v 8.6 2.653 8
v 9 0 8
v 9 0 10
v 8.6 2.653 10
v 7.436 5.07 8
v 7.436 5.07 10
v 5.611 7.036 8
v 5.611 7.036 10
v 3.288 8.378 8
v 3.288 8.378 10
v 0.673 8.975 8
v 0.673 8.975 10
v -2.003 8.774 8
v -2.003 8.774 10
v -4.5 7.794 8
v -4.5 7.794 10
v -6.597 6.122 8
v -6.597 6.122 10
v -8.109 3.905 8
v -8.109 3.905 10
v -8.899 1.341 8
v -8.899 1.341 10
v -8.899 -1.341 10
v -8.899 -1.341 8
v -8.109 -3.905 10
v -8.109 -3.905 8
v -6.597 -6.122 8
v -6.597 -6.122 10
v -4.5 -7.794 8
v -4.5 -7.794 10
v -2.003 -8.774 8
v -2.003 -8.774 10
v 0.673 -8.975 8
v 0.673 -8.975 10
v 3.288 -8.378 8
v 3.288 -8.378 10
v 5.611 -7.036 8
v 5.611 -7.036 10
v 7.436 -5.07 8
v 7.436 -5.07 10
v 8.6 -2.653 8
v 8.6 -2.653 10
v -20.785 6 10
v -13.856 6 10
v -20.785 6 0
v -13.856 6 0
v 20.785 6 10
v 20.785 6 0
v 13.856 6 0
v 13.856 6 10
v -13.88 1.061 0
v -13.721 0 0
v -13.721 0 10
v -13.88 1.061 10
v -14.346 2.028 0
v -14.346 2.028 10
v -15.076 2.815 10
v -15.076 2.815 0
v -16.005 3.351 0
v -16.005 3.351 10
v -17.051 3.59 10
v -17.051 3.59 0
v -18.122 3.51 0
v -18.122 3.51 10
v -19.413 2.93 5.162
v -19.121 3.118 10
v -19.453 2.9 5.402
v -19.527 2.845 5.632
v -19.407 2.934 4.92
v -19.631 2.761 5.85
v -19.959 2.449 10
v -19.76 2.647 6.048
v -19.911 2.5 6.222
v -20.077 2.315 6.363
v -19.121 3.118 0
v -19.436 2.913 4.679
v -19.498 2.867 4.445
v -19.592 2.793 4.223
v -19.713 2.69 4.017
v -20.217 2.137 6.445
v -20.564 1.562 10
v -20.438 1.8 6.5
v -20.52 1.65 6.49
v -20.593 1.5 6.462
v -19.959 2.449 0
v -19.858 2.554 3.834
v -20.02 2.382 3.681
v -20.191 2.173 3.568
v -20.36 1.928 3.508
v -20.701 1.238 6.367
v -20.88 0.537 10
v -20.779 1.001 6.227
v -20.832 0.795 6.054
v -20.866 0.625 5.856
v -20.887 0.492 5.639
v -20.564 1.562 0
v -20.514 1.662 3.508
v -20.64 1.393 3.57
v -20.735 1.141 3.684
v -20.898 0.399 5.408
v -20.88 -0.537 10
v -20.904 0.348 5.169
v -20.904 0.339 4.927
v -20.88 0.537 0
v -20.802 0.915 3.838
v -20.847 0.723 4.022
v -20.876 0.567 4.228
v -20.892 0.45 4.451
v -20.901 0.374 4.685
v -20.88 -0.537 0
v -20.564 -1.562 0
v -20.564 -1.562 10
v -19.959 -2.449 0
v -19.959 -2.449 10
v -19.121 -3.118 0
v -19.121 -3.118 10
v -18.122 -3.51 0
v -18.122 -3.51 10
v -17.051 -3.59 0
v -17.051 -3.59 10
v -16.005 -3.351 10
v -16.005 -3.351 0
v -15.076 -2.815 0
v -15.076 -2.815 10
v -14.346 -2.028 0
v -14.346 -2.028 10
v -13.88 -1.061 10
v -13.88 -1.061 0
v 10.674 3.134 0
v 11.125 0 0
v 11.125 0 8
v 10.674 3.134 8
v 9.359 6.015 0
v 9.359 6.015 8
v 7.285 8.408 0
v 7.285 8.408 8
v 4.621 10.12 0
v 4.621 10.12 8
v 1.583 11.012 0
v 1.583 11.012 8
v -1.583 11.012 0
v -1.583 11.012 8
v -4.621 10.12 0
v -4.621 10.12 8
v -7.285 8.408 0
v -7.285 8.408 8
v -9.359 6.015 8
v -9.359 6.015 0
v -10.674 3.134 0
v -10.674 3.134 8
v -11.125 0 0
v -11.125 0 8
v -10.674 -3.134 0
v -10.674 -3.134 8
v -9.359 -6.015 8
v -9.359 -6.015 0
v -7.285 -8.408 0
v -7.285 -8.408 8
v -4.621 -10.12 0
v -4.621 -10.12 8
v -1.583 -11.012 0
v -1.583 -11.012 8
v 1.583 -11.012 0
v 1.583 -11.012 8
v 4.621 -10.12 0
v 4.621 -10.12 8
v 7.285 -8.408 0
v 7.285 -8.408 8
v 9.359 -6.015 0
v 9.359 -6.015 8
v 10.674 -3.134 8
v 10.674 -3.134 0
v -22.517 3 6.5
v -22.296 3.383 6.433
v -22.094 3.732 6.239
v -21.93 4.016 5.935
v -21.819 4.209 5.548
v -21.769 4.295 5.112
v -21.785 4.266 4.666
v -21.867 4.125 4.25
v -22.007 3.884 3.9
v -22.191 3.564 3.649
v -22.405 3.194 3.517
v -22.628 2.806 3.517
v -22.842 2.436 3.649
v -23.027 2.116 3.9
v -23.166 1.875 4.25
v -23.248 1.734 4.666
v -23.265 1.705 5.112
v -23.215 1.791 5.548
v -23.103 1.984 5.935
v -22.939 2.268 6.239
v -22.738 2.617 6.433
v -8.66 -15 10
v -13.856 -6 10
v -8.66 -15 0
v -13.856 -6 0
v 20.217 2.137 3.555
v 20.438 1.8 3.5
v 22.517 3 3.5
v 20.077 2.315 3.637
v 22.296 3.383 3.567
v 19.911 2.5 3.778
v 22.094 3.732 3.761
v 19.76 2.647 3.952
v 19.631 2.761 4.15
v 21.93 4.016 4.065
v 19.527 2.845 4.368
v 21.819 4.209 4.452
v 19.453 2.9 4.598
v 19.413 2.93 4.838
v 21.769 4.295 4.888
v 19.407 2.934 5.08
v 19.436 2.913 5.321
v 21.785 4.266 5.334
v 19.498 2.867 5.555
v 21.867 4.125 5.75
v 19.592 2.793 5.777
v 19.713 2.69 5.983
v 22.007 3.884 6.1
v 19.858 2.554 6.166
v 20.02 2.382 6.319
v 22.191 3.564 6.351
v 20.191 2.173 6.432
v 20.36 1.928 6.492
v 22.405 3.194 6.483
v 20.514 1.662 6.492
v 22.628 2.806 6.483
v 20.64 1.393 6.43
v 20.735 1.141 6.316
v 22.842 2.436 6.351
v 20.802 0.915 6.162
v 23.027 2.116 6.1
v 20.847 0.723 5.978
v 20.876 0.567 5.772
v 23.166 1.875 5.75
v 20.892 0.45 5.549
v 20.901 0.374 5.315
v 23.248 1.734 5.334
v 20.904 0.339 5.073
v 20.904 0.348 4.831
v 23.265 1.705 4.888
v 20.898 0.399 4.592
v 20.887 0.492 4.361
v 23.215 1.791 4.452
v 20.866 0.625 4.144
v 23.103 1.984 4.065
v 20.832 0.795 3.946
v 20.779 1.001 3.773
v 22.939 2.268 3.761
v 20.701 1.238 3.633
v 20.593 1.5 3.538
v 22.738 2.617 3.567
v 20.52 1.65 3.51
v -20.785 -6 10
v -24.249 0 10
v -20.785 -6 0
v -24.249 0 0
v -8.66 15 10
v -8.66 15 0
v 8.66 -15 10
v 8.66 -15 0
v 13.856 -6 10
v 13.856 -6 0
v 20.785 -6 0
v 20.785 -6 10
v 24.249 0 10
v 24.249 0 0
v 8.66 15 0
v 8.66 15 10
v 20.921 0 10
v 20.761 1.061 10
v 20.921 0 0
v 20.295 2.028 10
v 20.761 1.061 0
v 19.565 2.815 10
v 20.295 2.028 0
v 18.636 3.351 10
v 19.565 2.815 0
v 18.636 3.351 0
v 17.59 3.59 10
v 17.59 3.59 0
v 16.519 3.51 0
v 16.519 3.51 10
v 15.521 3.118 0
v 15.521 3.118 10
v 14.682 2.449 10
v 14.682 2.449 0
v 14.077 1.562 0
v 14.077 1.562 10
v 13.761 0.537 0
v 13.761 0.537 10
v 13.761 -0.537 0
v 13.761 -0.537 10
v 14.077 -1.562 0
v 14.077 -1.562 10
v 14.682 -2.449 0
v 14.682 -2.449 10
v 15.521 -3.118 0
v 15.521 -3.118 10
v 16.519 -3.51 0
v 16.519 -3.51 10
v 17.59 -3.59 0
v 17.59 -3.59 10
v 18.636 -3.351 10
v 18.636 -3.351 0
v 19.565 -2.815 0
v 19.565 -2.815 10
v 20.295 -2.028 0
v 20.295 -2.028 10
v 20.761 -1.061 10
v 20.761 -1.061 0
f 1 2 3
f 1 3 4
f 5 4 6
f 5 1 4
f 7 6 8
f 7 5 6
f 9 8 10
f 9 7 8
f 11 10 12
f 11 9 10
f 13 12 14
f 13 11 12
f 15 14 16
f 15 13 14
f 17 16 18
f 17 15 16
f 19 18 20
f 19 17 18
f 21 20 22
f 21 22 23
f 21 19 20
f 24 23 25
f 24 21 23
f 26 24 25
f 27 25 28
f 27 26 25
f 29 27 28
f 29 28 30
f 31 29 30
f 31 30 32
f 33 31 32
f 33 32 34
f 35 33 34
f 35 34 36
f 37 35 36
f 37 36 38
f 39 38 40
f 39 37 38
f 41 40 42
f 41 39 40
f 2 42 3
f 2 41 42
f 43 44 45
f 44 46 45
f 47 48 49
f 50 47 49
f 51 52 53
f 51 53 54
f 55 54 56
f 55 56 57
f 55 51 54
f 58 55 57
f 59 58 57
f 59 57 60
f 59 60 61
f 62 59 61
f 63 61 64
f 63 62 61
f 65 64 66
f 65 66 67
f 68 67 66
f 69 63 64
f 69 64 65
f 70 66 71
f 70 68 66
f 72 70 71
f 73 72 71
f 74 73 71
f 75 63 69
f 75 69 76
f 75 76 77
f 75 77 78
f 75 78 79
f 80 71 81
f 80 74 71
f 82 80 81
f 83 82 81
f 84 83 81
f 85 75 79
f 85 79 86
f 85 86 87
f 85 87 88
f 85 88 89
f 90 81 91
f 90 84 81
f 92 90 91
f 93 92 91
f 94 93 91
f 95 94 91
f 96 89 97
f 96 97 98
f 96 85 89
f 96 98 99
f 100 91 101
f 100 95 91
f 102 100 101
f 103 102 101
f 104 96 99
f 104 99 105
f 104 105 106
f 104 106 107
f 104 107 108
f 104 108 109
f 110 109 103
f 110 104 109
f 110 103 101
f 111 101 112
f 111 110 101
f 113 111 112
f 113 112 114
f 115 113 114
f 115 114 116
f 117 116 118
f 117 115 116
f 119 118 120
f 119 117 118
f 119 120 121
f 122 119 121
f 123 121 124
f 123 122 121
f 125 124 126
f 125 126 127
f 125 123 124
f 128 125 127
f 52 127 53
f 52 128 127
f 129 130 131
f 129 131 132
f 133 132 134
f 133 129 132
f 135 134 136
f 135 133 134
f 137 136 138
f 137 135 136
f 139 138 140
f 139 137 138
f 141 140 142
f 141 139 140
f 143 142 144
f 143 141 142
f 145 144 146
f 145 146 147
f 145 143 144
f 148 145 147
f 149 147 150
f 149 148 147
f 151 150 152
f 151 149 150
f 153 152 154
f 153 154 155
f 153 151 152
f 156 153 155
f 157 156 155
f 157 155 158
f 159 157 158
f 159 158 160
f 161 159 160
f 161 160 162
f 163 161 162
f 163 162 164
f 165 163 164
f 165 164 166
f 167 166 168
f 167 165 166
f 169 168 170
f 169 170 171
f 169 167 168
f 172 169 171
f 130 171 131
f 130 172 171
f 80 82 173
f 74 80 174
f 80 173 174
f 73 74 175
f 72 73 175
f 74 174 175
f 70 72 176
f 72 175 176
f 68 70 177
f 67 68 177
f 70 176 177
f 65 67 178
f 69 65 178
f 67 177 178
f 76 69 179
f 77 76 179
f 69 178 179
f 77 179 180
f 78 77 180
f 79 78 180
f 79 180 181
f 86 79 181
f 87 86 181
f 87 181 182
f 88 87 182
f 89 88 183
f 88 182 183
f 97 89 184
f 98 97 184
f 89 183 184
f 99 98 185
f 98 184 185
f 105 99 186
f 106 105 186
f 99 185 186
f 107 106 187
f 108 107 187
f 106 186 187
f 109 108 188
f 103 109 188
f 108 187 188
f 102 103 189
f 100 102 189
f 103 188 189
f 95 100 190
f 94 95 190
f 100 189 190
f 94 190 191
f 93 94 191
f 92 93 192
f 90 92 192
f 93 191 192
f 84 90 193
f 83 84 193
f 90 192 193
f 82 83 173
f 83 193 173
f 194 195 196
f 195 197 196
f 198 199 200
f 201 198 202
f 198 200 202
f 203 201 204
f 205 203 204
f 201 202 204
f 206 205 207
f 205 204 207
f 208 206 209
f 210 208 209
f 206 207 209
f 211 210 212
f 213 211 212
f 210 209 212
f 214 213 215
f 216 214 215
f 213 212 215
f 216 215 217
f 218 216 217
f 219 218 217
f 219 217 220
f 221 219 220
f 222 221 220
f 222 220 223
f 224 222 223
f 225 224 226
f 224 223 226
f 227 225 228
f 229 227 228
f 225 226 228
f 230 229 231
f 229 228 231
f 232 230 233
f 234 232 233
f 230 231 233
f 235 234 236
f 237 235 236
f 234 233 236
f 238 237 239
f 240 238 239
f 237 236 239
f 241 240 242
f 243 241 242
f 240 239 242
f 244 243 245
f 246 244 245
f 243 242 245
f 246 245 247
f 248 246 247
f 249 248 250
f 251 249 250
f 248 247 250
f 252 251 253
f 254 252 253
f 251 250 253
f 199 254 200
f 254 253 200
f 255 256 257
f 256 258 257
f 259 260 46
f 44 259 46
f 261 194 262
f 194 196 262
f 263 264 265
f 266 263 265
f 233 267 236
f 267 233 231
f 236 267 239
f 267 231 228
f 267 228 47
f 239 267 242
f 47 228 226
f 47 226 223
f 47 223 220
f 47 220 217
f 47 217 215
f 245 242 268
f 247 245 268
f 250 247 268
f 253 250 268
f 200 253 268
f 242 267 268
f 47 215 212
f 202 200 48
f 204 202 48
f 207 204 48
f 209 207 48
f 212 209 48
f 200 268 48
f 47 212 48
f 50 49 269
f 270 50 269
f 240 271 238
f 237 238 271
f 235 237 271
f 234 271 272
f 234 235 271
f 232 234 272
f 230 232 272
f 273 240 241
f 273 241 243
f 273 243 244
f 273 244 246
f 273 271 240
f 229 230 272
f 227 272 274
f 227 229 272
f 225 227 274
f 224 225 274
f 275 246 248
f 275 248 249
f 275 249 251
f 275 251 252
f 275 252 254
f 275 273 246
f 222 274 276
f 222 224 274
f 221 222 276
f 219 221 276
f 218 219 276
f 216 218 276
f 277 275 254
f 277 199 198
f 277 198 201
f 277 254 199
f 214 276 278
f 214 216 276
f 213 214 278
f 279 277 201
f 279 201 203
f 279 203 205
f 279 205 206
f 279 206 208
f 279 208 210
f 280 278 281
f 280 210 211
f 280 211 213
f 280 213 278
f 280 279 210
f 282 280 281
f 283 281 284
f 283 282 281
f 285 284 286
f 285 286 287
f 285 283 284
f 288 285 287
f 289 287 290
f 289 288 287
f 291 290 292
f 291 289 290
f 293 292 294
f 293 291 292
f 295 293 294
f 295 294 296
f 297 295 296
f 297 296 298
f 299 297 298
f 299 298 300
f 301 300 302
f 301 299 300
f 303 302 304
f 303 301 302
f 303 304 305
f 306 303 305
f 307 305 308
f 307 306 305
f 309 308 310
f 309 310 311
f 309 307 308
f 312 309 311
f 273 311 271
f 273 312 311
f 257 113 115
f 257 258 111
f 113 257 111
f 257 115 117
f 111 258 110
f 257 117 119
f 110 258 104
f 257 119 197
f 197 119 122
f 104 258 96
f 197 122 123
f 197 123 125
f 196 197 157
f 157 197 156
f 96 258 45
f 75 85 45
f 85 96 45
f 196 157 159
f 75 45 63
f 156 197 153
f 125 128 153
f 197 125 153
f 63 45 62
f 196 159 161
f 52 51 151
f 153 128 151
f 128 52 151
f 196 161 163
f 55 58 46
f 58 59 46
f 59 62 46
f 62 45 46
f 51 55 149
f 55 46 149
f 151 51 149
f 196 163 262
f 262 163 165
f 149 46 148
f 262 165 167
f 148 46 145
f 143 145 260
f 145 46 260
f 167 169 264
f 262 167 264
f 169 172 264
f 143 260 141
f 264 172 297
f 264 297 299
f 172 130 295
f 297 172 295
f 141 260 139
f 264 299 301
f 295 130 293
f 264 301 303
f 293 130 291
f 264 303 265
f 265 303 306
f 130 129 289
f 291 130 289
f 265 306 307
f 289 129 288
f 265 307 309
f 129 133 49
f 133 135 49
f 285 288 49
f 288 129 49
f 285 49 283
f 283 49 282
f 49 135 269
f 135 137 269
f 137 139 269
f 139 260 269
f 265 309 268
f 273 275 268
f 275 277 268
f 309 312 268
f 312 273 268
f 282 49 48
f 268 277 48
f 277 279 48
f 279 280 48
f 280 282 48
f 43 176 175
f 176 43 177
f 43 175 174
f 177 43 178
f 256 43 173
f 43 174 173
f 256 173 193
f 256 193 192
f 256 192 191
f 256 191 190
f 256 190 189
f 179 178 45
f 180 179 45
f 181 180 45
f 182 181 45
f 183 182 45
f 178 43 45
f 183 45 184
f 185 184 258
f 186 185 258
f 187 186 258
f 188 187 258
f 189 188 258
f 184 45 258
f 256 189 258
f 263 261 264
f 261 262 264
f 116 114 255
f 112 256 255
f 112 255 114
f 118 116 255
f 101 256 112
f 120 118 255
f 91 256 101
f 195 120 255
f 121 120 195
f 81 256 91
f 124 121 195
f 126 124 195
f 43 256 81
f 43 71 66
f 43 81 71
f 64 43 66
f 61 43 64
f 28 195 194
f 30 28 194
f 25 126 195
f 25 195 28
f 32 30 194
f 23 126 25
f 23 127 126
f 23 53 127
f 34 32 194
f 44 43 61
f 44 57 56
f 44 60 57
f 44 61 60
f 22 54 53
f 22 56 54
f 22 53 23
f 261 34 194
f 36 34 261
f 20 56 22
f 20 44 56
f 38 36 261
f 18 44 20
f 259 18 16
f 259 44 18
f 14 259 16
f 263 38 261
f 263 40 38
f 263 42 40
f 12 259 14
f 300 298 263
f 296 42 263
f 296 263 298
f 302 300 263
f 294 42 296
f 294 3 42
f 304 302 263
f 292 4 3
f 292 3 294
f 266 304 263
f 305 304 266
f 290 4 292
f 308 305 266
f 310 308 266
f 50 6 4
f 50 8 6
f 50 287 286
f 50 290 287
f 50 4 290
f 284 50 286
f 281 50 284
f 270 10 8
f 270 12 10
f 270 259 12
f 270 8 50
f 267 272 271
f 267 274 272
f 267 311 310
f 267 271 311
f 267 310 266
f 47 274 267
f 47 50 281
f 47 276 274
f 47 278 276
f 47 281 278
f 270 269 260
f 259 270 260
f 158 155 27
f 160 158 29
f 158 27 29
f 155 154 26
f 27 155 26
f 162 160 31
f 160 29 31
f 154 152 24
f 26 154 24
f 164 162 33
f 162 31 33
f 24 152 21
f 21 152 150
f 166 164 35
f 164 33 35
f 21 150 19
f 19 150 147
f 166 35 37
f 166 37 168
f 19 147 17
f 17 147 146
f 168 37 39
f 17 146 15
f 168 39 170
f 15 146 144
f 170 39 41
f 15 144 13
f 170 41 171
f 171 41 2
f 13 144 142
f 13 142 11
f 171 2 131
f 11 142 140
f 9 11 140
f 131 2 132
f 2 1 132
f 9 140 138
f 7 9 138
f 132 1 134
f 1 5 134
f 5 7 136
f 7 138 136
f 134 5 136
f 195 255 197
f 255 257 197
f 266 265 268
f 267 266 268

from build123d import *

# Parameters (mm, degrees)
SKETCH3_R           = 11.125
SKETCH3_R_2         = 3.6
BOSS_EXTRUDE1_DEPTH = 8
SKETCH4_R           = 9
SKETCH4_R_2         = 3.6
BOSS_EXTRUDE3_DEPTH = 2
CUT_EXTRUDE1_REACH  = 51.5
SKETCH5_R           = 1.5
CUT_EXTRUDE2_REACH  = 51.5
SKETCH6_R           = 1.5


with BuildPart() as part:
    # Sketch3 → Boss-Extrude1 (new body)
    with BuildSketch(Plane.XY):
        Polygon((8.660254038, 15), (-8.660254038, 15), (-13.856406461, 6), (-20.784609691, 6), (-24.248711306, 0), (-20.784609691, -6), (-13.856406461, -6), (-8.660254038, -15), (8.660254038, -15), (13.856406461, -6), (20.784609691, -6), (24.248711306, 0), (20.784609691, 6), (13.856406461, 6), align=None)
        Circle(SKETCH3_R, mode=Mode.SUBTRACT)
        with Locations((17.320508076, 0)):
            Circle(SKETCH3_R_2, mode=Mode.SUBTRACT)
        with Locations((-17.320508076, 0)):
            Circle(SKETCH3_R_2, mode=Mode.SUBTRACT)
    extrude(amount=BOSS_EXTRUDE1_DEPTH)

    # Sketch4 → Boss-Extrude3 (add)
    with BuildSketch(Plane.XY.offset(8)):
        Polygon((-8.660254038, 15), (-13.856406461, 6), (-20.784609691, 6), (-24.248711306, 0), (-20.784609691, -6), (-13.856406461, -6), (-8.660254038, -15), (8.660254038, -15), (13.856406461, -6), (20.784609691, -6), (24.248711306, 0), (20.784609691, 6), (13.856406461, 6), (8.660254038, 15), align=None)
        Circle(SKETCH4_R, mode=Mode.SUBTRACT)
        with Locations((-17.320508076, 0)):
            Circle(SKETCH4_R_2, mode=Mode.SUBTRACT)
        with Locations((17.320508076, 0)):
            Circle(SKETCH4_R_2, mode=Mode.SUBTRACT)
    extrude(amount=BOSS_EXTRUDE3_DEPTH)

    # Sketch5 → Cut-Extrude1 (cut, up to next)
    with BuildSketch(Plane(origin=(-18.186533479, 10.5, 0), x_dir=(0, 0, 1), z_dir=(-0.866025404, 0.5, 0)), mode=Mode.PRIVATE) as cut_extrude1_sk1:
        with Locations((5, -8.660254038)):
            Circle(SKETCH5_R)
    cut_extrude1_tool1 = extrude(cut_extrude1_sk1.sketch, amount=-CUT_EXTRUDE1_REACH, mode=Mode.PRIVATE) & part.part
    add(cut_extrude1_tool1.solids().sort_by_distance((-22.51666, 3, 5))[0], mode=Mode.SUBTRACT)

    # Sketch6 → Cut-Extrude2 (cut, up to next)
    with BuildSketch(Plane(origin=(18.186533479, 10.5, 0), x_dir=(0, 0, -1), z_dir=(0.866025404, 0.5, 0)), mode=Mode.PRIVATE) as cut_extrude2_sk1:
        with Locations((-5, -8.660254038)):
            Circle(SKETCH6_R)
    cut_extrude2_tool1 = extrude(cut_extrude2_sk1.sketch, amount=-CUT_EXTRUDE2_REACH, mode=Mode.PRIVATE) & part.part
    add(cut_extrude2_tool1.solids().sort_by_distance((22.51666, 3, 5))[0], mode=Mode.SUBTRACT)


solid = part.part
